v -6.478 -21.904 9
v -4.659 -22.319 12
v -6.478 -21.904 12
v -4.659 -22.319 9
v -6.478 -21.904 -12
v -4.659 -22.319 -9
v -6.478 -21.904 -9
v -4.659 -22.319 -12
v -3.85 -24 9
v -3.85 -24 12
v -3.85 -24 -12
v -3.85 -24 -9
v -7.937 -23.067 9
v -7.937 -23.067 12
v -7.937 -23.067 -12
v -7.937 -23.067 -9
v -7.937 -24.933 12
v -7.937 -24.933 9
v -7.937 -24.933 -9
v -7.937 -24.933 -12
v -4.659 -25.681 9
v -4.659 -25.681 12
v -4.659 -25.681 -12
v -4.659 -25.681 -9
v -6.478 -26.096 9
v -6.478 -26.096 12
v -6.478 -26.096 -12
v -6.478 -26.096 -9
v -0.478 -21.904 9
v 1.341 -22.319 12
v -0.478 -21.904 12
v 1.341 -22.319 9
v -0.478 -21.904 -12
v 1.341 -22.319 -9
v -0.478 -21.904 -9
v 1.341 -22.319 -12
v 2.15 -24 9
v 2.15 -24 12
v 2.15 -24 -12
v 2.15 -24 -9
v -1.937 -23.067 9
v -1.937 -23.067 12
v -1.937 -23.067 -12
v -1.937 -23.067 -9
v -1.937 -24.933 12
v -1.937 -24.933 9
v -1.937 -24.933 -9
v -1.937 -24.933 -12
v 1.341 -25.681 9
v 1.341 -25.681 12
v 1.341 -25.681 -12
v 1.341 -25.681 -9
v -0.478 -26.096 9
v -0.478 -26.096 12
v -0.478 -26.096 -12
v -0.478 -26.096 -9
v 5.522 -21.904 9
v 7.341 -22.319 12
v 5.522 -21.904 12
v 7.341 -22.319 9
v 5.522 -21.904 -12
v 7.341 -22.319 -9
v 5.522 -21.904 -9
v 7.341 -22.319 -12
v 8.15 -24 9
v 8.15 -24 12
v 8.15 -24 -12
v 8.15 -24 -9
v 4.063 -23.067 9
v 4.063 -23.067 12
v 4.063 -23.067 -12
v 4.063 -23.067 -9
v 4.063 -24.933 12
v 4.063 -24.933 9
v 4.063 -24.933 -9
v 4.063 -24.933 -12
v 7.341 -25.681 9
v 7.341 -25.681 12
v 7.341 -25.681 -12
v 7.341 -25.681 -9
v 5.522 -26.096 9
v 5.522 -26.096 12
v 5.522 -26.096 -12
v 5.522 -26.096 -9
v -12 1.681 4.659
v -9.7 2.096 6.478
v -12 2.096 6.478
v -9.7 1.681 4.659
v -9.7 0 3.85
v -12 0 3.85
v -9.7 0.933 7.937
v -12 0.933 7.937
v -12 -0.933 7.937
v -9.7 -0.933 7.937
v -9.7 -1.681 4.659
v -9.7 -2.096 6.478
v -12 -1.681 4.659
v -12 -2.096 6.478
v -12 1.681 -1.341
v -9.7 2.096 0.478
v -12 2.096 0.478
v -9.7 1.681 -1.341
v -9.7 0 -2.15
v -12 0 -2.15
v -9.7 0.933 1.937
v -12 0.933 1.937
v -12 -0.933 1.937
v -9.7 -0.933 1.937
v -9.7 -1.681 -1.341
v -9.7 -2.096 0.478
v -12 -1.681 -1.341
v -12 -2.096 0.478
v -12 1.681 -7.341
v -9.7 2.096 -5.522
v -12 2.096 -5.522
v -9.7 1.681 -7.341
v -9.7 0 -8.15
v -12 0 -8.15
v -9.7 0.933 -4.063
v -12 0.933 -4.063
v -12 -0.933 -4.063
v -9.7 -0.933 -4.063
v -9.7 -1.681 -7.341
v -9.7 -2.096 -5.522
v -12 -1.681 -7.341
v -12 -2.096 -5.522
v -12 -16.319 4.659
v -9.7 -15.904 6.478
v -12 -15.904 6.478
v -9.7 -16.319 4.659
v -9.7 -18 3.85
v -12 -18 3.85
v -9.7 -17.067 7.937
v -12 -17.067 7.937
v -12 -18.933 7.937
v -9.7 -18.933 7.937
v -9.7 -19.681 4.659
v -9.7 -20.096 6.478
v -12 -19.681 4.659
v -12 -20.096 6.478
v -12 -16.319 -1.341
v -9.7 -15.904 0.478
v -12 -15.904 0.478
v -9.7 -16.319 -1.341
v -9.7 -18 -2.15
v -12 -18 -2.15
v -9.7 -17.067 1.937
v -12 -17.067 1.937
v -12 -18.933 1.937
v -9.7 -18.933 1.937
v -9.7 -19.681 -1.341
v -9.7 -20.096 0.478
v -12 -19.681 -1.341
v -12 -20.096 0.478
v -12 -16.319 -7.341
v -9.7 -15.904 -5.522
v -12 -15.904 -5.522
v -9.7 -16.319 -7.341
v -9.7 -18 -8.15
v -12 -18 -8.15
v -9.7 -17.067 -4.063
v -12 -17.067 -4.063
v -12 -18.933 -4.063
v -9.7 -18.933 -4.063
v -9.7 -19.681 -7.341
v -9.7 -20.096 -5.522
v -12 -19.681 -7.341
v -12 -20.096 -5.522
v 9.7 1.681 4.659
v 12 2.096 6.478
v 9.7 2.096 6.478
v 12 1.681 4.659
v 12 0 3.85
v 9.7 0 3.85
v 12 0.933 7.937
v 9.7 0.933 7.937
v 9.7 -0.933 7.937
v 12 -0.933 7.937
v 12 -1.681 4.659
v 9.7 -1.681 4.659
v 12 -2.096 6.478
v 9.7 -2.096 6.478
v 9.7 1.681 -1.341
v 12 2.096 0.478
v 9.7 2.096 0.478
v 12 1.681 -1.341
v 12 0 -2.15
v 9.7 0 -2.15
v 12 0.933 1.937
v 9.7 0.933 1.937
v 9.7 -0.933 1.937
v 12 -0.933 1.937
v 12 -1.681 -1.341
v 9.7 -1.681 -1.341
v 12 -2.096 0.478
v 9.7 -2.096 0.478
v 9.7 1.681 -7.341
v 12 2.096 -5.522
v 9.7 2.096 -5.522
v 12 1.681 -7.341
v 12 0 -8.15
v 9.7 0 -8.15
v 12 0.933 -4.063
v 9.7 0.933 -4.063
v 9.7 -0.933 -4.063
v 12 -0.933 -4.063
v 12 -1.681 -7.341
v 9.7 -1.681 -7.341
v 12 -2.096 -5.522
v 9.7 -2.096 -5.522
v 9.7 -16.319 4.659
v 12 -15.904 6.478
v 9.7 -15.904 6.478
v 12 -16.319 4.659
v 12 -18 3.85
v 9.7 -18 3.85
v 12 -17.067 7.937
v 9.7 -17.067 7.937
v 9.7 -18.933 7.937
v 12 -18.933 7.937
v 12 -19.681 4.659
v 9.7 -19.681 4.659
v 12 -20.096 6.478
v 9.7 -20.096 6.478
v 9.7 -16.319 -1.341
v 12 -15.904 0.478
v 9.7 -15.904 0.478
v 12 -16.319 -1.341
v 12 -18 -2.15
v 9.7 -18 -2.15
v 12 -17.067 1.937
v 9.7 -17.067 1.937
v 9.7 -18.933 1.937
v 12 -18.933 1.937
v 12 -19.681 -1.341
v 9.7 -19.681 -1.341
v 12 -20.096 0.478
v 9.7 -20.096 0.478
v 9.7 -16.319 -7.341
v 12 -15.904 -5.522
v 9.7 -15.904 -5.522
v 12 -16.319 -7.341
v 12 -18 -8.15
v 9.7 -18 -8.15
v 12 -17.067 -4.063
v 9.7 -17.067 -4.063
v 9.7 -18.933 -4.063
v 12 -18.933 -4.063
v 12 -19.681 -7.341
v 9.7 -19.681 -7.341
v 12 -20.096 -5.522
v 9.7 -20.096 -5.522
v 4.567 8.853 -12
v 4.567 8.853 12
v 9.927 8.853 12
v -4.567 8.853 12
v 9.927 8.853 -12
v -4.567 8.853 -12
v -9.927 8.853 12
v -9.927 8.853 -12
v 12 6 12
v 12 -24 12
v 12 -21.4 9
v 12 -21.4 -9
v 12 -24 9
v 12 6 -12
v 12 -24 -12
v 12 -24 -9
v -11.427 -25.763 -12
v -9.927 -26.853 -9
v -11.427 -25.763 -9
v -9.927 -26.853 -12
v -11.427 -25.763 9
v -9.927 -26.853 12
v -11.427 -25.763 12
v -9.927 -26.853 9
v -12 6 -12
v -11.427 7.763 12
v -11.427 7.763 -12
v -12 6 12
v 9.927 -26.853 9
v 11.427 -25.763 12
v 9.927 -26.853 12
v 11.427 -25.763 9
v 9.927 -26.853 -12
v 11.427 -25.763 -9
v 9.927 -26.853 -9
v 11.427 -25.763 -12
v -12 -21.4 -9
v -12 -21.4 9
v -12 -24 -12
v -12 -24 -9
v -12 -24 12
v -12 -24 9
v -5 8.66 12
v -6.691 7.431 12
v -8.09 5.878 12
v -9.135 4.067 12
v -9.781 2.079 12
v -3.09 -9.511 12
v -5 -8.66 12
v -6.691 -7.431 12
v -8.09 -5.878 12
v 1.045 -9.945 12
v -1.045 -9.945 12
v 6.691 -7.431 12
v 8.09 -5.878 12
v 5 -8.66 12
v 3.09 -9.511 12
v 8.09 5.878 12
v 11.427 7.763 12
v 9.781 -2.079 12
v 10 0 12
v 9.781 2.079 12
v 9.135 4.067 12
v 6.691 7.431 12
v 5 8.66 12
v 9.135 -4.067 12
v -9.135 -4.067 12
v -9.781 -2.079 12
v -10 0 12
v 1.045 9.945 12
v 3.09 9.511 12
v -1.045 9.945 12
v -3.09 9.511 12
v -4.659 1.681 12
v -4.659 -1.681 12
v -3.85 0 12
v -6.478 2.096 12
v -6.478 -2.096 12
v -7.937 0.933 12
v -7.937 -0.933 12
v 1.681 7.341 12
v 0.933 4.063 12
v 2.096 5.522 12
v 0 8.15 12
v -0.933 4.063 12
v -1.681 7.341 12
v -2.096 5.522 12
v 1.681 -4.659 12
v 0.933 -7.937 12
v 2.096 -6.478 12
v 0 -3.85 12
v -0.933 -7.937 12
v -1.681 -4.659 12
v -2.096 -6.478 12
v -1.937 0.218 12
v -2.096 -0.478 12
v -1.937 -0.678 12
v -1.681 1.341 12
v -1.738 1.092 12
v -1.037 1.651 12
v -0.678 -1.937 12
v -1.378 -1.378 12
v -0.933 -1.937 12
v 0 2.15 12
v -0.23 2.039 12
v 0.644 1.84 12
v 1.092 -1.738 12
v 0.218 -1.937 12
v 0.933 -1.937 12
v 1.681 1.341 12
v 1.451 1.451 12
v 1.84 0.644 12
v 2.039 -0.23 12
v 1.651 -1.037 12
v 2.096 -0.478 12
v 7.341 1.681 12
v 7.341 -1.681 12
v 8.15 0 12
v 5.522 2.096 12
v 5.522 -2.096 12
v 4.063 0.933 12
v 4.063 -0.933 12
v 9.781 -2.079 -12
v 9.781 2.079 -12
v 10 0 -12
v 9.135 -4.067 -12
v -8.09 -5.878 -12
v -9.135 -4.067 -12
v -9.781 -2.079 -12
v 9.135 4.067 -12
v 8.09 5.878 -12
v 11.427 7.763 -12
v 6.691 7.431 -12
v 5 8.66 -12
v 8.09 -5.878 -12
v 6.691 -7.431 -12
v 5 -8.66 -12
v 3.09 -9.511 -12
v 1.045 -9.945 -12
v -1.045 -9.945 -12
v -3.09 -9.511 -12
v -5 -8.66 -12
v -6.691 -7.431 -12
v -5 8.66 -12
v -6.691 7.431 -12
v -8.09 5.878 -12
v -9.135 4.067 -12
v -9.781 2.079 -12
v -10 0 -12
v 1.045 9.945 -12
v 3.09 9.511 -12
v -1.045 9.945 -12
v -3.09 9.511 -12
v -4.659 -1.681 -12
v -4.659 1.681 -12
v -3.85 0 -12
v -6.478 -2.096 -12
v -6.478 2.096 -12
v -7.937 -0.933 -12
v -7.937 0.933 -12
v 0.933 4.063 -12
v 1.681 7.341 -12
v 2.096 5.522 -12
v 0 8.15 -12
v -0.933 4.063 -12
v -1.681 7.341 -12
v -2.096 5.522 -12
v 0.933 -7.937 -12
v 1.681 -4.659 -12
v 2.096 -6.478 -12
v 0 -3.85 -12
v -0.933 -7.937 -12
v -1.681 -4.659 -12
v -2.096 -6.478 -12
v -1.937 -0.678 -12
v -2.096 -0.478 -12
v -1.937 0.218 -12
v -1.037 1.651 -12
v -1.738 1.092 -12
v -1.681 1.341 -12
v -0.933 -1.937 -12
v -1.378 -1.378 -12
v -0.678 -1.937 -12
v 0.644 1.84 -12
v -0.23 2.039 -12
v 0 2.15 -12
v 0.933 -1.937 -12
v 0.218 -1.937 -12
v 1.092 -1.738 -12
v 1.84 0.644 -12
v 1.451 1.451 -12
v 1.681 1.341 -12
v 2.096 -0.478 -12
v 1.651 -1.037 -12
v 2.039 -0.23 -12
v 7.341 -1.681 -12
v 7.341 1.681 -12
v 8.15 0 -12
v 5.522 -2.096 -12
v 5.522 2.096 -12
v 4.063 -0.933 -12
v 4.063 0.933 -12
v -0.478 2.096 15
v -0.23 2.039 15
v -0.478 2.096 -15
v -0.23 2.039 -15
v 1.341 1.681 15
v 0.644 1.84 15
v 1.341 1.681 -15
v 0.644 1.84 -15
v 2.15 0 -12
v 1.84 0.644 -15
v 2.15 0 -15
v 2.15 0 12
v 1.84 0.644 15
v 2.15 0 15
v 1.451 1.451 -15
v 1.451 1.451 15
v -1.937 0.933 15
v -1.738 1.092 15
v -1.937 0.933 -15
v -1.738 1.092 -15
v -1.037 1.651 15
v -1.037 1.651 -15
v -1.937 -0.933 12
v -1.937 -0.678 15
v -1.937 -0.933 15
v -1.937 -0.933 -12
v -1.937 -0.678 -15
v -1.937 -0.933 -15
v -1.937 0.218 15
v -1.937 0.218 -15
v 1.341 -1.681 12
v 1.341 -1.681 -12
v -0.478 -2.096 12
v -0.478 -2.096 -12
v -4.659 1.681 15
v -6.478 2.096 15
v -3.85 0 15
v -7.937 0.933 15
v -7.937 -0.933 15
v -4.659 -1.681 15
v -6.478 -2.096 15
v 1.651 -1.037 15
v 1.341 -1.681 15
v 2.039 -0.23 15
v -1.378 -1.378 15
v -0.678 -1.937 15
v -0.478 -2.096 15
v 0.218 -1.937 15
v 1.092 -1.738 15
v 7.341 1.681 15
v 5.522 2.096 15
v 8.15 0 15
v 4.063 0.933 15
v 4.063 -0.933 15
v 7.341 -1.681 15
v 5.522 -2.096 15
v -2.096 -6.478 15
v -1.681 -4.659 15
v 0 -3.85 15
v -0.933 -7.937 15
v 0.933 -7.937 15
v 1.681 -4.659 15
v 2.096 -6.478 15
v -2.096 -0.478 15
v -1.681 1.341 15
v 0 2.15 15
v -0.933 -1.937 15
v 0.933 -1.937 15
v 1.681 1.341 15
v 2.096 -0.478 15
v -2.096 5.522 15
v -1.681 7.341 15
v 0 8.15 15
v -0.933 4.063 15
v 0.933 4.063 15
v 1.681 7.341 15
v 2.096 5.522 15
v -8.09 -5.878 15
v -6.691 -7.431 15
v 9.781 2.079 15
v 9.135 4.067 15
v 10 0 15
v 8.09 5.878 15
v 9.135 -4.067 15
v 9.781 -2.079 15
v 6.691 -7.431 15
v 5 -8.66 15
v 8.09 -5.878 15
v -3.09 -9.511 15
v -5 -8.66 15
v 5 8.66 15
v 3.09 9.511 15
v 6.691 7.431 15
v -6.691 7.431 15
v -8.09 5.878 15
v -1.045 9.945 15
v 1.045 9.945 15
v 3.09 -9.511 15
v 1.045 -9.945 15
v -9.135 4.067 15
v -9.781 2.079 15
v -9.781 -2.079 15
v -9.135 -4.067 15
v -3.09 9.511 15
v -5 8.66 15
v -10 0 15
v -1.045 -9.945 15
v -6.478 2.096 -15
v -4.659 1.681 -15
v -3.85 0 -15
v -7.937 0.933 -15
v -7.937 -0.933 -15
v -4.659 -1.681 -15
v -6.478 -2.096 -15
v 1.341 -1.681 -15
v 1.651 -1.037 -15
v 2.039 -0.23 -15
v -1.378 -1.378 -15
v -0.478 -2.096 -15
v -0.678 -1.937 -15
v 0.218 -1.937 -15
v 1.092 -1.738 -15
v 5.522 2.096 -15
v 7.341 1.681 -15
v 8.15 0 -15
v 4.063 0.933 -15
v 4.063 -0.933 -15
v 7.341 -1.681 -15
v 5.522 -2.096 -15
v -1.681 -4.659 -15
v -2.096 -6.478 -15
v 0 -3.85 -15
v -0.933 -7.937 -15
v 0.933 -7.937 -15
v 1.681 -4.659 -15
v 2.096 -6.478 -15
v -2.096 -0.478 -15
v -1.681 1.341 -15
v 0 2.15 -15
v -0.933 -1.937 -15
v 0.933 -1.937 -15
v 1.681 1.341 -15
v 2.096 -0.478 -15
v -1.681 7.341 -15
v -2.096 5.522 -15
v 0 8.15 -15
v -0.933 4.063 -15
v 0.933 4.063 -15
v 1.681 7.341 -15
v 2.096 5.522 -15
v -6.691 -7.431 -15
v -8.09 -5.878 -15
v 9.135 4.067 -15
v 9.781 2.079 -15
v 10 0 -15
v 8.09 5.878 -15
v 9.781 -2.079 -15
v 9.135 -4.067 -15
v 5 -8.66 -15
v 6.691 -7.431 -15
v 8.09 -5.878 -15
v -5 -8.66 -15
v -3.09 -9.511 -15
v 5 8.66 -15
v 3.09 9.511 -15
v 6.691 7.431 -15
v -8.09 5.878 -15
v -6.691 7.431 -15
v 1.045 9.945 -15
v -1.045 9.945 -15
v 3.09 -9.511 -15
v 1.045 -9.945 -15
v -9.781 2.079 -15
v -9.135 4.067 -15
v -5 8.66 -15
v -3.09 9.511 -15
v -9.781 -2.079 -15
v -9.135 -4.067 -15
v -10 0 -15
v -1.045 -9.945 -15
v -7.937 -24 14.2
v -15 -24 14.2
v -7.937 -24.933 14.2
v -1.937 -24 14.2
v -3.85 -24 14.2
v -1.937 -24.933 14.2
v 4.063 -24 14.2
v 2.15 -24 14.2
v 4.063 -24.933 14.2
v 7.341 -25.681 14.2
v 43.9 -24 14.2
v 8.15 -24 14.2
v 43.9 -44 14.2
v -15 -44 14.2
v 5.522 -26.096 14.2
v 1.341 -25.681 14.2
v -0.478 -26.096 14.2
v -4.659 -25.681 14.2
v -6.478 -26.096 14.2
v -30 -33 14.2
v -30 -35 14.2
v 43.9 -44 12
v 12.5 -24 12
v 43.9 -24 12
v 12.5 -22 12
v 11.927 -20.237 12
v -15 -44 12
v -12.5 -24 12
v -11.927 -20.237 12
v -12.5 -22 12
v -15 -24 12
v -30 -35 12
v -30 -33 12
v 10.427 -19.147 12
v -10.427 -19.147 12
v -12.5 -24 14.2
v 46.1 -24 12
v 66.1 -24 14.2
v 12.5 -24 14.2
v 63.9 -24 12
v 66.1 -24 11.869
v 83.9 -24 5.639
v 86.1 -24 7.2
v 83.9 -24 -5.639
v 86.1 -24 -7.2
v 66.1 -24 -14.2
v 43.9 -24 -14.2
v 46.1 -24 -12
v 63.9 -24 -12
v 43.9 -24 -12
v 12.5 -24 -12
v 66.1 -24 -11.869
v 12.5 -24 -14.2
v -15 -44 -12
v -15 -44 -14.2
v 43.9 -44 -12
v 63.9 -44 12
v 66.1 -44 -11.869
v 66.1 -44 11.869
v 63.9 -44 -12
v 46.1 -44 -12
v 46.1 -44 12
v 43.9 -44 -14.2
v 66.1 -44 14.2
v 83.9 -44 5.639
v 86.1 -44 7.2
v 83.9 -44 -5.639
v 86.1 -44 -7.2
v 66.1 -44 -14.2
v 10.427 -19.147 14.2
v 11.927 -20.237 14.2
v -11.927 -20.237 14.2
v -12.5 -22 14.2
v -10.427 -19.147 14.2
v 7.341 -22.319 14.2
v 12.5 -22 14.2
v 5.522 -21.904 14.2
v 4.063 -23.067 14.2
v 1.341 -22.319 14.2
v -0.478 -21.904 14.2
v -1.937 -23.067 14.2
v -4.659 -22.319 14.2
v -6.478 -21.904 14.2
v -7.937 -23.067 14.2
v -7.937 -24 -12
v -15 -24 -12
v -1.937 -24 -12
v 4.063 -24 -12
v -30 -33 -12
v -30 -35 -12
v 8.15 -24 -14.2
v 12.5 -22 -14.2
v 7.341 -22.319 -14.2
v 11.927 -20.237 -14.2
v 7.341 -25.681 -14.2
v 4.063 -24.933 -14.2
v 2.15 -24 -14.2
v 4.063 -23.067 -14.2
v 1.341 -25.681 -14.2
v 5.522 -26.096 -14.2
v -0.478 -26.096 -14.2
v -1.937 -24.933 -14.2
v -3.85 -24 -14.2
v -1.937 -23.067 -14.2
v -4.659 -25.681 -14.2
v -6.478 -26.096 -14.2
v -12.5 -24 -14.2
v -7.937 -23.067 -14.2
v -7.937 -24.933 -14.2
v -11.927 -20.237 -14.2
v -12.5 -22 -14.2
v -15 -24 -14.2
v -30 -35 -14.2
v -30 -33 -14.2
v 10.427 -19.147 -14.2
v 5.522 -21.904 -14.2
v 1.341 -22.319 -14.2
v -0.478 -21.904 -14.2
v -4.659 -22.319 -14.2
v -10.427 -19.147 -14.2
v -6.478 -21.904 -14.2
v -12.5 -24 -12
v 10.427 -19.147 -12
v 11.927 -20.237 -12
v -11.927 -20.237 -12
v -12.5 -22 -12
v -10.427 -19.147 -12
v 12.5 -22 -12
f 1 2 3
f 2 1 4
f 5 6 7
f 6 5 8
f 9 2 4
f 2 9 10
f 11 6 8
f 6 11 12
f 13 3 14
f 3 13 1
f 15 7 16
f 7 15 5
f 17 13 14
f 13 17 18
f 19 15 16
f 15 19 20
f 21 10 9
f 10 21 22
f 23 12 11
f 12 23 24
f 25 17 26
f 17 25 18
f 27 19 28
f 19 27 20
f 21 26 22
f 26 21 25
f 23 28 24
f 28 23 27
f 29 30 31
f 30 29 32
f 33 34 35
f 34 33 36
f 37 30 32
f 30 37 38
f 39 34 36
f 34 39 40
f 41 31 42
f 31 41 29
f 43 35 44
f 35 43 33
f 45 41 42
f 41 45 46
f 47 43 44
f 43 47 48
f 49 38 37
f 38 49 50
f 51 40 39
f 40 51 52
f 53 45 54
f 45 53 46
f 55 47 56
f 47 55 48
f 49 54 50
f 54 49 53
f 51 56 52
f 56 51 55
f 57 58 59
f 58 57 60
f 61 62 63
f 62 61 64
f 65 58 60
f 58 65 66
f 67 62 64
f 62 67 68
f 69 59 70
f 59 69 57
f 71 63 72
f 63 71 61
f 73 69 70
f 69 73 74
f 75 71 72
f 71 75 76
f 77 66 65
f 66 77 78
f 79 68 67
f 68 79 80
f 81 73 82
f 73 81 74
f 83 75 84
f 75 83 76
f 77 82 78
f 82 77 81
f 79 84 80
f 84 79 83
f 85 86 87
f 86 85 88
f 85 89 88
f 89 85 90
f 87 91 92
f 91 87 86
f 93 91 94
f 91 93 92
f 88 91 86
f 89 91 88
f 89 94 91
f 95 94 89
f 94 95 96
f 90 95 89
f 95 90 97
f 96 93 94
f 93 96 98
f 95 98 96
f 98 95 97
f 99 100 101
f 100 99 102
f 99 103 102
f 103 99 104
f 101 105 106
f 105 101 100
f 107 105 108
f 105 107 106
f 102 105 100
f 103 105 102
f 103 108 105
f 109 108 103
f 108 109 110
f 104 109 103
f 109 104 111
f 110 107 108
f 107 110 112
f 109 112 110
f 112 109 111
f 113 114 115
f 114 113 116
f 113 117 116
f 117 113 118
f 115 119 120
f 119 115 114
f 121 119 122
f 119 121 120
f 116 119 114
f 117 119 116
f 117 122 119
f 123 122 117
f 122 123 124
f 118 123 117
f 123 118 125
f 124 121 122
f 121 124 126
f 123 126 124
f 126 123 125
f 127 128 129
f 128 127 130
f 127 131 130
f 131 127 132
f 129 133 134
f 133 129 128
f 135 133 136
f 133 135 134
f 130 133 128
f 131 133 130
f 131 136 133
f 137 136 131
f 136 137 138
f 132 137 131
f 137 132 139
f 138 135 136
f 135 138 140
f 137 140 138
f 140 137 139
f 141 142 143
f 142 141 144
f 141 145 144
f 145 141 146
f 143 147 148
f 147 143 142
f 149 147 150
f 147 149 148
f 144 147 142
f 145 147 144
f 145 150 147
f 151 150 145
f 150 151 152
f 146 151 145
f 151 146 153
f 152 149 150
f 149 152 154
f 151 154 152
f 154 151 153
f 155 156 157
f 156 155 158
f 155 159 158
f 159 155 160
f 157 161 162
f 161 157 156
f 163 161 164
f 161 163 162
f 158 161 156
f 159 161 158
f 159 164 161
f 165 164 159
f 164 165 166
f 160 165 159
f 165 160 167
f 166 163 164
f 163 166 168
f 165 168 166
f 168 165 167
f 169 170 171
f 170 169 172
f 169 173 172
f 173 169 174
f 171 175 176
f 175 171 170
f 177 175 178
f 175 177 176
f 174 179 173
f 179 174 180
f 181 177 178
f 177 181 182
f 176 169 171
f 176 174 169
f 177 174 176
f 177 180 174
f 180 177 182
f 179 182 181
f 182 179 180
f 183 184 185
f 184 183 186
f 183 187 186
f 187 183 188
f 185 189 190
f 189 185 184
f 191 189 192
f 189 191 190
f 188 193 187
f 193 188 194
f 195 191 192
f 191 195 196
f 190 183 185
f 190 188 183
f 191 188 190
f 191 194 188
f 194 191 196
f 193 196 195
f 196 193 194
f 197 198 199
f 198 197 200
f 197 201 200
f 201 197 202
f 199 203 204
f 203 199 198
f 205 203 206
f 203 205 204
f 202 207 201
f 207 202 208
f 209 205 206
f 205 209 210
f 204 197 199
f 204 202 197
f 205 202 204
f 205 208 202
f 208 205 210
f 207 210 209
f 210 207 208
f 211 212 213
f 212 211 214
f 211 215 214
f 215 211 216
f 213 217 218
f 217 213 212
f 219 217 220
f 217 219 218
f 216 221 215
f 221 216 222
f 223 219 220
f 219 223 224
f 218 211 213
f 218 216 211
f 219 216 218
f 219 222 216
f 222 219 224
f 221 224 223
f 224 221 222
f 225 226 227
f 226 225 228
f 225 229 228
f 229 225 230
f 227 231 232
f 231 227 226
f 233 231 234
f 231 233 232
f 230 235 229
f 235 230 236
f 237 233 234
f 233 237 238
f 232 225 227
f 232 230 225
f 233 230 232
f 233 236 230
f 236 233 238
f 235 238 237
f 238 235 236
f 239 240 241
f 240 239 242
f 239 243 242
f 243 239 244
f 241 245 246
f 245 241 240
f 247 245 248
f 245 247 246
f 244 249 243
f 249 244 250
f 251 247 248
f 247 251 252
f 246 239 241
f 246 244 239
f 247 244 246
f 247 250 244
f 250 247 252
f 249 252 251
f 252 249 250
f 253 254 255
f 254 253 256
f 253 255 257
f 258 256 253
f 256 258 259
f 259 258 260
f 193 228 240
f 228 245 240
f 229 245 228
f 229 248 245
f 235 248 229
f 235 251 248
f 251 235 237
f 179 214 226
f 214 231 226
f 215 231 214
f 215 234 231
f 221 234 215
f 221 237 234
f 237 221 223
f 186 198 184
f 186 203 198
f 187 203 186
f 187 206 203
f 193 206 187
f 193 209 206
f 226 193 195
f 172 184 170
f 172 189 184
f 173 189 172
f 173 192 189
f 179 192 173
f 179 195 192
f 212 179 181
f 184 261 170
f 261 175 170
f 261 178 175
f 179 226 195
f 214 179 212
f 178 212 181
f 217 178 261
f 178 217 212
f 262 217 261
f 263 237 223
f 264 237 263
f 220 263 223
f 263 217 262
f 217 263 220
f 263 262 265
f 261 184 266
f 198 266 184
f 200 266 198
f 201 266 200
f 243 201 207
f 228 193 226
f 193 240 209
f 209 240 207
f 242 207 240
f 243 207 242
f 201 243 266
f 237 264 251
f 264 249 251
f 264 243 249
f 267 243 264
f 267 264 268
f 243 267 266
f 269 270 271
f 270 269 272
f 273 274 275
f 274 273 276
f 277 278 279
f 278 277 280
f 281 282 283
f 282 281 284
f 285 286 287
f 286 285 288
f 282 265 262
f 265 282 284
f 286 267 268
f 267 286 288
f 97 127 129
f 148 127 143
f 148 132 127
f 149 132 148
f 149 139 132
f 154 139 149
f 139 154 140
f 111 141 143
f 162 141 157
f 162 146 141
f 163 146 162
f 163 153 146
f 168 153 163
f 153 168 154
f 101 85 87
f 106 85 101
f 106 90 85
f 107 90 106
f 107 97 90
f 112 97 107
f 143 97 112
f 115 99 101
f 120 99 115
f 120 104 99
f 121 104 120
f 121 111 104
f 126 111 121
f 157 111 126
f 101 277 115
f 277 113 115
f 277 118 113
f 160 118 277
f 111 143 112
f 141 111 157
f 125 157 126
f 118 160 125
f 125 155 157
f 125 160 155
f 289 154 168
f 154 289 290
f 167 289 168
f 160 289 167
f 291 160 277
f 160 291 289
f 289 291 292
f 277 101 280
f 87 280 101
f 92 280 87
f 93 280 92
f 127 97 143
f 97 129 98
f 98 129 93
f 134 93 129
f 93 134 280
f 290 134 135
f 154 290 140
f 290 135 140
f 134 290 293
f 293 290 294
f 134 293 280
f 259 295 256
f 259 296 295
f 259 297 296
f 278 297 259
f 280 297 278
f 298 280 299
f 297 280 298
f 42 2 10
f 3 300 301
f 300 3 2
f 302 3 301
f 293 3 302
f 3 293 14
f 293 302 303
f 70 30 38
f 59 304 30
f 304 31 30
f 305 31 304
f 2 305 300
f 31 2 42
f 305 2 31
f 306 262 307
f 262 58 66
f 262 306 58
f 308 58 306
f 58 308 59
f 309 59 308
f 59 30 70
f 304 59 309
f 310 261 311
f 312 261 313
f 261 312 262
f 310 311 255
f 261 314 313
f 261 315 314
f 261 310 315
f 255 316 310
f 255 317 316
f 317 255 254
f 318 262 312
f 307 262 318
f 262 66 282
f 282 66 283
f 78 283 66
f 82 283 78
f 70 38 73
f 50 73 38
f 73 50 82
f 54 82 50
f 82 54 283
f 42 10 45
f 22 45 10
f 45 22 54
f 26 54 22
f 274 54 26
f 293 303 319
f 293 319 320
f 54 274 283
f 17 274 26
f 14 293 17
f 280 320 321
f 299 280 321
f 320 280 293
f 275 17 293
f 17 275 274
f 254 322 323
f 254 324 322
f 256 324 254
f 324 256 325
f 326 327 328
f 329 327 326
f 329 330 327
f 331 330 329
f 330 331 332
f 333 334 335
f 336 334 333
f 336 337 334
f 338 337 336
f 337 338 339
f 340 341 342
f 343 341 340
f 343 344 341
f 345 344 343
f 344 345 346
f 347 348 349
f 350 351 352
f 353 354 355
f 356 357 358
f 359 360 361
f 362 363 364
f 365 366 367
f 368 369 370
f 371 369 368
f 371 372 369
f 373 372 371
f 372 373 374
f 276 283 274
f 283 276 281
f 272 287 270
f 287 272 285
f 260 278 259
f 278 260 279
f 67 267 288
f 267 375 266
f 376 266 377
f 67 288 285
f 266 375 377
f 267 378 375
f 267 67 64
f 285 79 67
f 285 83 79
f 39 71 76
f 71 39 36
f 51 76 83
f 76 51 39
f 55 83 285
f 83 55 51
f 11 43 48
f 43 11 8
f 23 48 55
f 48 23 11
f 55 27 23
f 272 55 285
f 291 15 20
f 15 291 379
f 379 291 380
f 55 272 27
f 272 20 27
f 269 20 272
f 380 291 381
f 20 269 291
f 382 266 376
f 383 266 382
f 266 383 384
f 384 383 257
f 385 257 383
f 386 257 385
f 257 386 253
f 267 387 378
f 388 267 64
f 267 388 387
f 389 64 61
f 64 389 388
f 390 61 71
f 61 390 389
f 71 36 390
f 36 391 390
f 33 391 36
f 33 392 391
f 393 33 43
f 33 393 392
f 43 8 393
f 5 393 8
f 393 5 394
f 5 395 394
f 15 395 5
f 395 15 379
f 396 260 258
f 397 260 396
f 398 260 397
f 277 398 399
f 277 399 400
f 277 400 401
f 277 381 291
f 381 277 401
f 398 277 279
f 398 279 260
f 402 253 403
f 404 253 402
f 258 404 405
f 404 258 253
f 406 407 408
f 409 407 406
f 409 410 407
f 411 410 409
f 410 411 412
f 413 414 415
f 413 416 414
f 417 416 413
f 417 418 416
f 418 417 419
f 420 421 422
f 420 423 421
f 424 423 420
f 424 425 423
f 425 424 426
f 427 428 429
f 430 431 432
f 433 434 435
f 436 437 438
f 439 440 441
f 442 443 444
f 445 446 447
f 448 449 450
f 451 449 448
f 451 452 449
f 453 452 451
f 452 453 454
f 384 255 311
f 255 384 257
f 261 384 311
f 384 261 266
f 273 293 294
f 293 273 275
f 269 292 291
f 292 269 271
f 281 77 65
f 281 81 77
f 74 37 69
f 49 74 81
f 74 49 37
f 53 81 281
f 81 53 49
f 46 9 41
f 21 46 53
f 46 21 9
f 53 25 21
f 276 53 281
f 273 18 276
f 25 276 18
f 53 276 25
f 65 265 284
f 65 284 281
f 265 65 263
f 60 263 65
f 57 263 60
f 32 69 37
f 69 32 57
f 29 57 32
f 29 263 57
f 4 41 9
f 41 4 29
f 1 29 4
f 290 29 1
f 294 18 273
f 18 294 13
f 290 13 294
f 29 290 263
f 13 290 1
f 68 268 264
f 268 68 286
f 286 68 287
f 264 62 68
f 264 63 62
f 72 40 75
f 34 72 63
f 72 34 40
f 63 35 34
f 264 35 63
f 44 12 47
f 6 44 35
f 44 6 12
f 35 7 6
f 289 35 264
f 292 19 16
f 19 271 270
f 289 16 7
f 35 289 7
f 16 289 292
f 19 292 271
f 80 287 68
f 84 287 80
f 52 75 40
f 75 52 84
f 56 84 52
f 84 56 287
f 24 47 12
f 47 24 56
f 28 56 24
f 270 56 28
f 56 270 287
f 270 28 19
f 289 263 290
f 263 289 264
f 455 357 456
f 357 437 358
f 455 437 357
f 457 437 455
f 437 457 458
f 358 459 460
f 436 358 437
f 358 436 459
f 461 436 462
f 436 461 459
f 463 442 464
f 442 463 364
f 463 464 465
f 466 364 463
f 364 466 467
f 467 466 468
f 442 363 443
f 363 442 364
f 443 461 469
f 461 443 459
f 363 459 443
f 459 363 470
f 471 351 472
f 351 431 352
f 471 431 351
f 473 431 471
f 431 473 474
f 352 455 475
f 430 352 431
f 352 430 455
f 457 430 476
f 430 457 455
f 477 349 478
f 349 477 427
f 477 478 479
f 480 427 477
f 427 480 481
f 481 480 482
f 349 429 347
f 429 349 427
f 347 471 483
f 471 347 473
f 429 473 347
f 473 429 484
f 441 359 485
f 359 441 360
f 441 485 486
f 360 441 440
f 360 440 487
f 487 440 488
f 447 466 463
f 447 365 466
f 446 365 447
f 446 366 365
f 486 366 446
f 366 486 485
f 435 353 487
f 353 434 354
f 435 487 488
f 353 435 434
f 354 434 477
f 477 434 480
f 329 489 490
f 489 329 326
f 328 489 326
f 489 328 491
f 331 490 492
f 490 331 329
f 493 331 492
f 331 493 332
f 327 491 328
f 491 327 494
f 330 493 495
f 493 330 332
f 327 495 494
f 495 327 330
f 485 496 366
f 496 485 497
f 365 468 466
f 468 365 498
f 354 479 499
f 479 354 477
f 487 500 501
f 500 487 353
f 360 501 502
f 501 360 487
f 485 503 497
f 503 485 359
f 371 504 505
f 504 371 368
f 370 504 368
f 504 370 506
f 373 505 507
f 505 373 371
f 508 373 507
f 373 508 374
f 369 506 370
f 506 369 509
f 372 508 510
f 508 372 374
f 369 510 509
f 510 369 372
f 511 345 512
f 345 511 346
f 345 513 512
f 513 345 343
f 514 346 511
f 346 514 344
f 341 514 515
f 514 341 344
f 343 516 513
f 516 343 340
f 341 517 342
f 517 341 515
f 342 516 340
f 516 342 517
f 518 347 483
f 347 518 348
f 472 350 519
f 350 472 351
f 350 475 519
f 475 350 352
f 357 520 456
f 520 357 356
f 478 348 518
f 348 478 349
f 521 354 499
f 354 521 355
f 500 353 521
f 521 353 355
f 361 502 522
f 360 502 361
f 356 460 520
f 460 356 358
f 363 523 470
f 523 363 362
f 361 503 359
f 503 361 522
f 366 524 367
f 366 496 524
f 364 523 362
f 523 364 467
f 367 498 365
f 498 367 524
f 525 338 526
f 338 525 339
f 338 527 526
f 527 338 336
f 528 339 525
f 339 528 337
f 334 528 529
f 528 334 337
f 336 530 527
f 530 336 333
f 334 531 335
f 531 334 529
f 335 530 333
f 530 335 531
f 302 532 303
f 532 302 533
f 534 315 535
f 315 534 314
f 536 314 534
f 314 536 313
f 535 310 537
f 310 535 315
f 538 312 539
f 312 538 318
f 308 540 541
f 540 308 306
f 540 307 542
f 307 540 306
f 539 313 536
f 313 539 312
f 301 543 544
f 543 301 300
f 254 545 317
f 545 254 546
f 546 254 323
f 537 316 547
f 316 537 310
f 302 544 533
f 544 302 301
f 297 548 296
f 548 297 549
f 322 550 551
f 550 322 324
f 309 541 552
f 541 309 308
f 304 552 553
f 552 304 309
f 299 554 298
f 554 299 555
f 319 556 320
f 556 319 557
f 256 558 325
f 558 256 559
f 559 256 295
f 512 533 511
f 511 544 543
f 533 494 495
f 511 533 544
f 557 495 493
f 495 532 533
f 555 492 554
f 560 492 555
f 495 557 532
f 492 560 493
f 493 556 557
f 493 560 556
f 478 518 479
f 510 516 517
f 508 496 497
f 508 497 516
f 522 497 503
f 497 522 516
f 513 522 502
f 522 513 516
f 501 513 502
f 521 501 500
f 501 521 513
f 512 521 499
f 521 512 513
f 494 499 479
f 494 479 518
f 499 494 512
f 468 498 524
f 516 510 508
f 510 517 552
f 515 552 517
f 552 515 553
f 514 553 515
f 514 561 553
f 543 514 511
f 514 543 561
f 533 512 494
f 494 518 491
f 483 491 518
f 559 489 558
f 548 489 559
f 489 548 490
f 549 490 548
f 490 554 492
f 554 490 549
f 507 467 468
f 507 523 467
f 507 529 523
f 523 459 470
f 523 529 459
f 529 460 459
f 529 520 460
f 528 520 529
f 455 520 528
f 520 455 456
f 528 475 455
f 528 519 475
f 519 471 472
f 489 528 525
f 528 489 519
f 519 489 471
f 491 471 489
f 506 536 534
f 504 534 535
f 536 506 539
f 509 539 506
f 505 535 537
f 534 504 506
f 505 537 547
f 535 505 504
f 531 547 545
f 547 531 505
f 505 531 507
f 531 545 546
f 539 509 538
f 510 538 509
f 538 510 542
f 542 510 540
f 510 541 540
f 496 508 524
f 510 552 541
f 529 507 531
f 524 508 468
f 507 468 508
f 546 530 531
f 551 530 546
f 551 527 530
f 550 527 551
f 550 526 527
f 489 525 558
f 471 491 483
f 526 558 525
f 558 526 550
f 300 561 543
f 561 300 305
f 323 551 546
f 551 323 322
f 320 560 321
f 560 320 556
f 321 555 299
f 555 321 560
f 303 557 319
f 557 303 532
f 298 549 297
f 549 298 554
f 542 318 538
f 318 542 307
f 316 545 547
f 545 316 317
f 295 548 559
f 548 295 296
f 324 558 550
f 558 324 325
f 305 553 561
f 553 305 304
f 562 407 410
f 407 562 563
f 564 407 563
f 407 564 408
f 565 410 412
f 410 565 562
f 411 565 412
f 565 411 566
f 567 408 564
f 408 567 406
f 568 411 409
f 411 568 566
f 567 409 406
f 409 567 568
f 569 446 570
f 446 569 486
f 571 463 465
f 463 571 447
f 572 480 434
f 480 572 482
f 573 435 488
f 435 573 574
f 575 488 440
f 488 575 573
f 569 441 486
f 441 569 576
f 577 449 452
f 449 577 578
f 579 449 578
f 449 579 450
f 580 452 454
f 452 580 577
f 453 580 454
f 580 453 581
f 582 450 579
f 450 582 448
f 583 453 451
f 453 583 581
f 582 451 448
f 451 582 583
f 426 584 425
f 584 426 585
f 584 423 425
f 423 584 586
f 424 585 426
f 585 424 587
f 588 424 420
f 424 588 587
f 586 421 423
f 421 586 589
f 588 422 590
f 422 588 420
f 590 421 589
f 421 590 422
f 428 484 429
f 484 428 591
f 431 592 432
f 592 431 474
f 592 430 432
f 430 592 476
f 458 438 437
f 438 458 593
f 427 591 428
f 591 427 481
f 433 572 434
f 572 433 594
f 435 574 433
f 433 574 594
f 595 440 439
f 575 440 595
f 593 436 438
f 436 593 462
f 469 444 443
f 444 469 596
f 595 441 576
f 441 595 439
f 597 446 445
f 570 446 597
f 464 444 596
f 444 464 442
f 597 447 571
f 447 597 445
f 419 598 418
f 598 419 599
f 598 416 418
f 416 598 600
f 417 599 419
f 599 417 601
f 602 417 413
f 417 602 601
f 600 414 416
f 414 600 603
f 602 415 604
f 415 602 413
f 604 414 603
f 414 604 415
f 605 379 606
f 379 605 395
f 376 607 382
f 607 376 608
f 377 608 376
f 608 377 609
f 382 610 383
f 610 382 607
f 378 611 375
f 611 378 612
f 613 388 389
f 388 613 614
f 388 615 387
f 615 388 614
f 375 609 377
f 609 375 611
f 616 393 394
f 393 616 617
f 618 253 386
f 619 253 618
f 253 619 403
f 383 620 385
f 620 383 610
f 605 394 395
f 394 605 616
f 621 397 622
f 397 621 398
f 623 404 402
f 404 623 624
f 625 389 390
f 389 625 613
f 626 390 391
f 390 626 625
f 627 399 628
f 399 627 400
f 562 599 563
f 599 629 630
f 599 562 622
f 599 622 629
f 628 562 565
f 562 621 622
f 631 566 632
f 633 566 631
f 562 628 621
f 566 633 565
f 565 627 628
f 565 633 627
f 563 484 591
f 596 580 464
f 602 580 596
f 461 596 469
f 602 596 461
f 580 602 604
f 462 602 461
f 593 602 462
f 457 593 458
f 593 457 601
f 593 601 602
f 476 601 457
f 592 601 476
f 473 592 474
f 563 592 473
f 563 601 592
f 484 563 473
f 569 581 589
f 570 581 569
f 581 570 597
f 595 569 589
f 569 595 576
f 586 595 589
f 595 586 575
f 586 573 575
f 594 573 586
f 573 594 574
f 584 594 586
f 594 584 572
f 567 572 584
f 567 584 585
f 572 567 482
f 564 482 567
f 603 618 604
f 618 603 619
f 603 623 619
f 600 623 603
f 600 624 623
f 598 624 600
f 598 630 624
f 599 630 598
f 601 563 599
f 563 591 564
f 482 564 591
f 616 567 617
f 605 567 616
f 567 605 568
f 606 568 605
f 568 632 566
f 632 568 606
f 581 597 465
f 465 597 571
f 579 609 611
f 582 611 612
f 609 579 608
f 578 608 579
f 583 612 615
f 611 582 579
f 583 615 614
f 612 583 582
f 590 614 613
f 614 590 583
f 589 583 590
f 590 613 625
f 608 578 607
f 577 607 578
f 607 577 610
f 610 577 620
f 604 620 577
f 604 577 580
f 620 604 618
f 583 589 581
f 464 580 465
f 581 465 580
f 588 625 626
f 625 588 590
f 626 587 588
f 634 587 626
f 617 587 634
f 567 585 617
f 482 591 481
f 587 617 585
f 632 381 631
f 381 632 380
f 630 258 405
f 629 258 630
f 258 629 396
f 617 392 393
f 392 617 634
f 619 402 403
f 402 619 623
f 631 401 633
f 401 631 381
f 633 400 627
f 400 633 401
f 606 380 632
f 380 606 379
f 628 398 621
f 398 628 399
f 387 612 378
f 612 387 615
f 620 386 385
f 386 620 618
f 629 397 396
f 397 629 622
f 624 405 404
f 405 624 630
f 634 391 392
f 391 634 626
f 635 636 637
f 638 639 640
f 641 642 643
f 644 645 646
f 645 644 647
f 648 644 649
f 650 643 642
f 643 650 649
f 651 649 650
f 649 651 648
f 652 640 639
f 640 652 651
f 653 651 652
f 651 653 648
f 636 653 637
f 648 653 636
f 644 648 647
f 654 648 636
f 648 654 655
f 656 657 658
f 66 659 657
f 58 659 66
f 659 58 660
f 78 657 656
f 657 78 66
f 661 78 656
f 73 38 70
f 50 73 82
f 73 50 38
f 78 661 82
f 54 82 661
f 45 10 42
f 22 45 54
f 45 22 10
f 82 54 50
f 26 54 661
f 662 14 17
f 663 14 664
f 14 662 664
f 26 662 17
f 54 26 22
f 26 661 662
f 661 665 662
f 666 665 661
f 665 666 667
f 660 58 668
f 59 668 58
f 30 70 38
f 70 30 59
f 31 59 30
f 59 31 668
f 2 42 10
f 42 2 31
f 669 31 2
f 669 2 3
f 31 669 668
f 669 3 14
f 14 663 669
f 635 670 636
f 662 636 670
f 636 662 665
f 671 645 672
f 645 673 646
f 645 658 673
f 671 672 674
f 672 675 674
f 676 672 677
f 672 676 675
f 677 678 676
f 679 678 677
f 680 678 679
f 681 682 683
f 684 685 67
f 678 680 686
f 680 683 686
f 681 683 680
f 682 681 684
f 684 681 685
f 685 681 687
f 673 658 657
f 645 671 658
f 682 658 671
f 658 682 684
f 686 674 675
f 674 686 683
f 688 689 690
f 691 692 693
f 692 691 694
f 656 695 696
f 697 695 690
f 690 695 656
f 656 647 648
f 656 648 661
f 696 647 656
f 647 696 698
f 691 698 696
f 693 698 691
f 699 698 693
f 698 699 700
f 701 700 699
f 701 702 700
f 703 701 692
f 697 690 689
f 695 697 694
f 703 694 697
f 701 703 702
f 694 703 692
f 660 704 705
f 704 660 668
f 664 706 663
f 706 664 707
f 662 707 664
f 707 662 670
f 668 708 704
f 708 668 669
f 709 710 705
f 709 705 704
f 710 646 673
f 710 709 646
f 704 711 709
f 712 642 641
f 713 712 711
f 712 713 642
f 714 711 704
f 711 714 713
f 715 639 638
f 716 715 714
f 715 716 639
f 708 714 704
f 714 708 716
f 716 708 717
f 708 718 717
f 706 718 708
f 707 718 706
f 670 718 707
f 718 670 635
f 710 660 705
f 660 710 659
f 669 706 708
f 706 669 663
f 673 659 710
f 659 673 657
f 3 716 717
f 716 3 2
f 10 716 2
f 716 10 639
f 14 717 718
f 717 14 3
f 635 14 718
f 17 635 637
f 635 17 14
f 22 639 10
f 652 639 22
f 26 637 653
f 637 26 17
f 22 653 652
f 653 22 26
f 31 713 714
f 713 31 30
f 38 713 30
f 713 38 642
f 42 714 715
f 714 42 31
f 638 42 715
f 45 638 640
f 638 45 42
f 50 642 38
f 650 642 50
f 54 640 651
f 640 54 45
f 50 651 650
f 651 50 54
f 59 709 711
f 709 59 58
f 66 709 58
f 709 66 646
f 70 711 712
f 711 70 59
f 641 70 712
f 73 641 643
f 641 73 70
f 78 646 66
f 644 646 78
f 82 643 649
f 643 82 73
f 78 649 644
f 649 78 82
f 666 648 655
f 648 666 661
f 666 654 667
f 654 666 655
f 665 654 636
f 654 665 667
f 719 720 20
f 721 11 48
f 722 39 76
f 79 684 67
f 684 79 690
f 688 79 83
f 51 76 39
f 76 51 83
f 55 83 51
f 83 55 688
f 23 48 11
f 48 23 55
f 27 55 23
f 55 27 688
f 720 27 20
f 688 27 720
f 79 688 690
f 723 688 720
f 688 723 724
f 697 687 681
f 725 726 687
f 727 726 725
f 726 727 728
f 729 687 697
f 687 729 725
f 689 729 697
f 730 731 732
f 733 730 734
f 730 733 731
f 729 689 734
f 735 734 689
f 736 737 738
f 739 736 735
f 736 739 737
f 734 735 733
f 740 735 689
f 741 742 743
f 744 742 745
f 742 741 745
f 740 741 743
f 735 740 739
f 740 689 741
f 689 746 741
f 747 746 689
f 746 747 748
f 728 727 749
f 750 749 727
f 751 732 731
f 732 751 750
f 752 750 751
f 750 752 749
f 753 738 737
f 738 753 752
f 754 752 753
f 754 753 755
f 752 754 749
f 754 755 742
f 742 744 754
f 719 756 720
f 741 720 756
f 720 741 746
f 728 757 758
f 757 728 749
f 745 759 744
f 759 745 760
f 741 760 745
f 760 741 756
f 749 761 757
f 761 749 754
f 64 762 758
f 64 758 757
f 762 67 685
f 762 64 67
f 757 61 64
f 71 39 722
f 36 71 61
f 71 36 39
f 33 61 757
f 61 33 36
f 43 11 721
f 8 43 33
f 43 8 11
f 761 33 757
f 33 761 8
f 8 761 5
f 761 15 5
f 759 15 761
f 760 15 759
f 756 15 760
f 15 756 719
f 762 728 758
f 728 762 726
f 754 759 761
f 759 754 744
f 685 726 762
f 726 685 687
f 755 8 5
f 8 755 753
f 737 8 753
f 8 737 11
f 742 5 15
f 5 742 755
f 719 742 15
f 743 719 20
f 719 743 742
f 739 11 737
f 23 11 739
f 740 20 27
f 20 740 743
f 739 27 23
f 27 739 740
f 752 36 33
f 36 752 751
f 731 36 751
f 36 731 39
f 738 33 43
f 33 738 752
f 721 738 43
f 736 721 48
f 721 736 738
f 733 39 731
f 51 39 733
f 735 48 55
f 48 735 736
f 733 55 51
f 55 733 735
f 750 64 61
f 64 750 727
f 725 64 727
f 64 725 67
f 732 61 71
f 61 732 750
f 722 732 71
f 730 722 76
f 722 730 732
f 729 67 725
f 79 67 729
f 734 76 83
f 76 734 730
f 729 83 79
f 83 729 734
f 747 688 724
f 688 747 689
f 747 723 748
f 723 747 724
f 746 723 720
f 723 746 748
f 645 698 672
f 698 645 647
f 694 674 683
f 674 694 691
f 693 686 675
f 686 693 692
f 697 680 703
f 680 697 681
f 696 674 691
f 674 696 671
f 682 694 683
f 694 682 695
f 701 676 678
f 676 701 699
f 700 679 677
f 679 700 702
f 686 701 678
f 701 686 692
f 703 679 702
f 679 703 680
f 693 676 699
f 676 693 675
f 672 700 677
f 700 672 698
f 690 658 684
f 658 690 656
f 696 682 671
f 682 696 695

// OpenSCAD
// file: ../models/arm.scad
Collisions=false;
include <ollo.scad>;

module arm_pulley(pulley=false)
{
	c = pulley?[0.6,0.6,0.6]:[0.2,0.2,0.2];
    if (!Collisions) {
	    color(c) {
		difference() {
		    cylinder(d=20, h=OlloWidth);
		    servoArm(OlloWidth, false);
		}
	    }
    }
}

//:Model "Arm" [0.1,0.1,0.1]
module arm(pulley=false) {
    arm_pulley();
}

//:Model "Pulley" [0.6,0.6,0.6]
module pulley() {
    //:BOM "Ollo pulley" 0.2 http://www.robotis-shop-en.com/?act=shop_en.goods_view&GS=1590
    arm_pulley(true);
}

arm();
// file: ../models/motor.scad
Collisions=false;
include <ollo.scad>;
include <motor_values.scad>;
use <../util/rounded.scad>;

//:Model "Motor" [0.4,0.45,0.4]
//:Mass 16.7
module motor(thickness=2.2) {
    //:BOM "XL-320 Servo" 21.9 http://www.robotis-shop-en.com/?act=shop_en.goods_view&GS=1611
    translate([0,-MotorArmOffset,-MotorDepth/2]) {
        color([0.25,0.25,0.25]) {
            difference() {
                rounded(MotorWidth,MotorHeight,MotorDepth,3,center=true);

		if (!Collisions) {
			// Bottom
			translate([-MotorWidth/2-0.1,-MotorHeight/2-0.1,3])
			    cube([MotorWidth+0.2, 5.7, MotorDepth-6]);

			translate([0,-MotorHeight/2+3])
			    threeOllo(MotorDepth, false);

			// Motor shaft
			translate([0, MotorArmOffset])
			    olloHole(MotorDepth+5, false);

			// Side holes
			for (side=[-MotorWidth/2,MotorWidth/2-thickness]) {
			    translate([side,9,MotorDepth/2]) {
				rotate([0,90,0]) {
				    threeOllo(thickness, false);
				    translate([0,-3*OlloSpacing,0])
					threeOllo(thickness, false);
				}
			    }
			}
		}
            }
        }
    }
}

motor();
// file: ../util/rounded.scad
Collisions=false;

// Do a rounded cube
module rounded(x=10, y=10, z=10, r=3, center=false) {
    if (Collisions) {
        translate([0,0,center?(z/2):0])
            cube([x,y,z], center=center);
    } else {
        if (center) {
            translate([-(x/2),-(y/2),0])
                rounded(x, y, z, r);
        } else {
            translate([r,r,0])
                minkowski() {
                    cube([x-2*r,y-2*r,z/2]);
                    cylinder(h=z/2, r=r);
                }
        }
    }
}
// file: ../models/ollo.scad
Collisions=false;

// Diameter of plastic ollo holes
OlloHoles = 4.3;

// Width of Ollo "real" plastic
OlloWidth = 3;

// Distance between two ollo holes
OlloSpacing = 6;

module rivet()
{
    //:BOM "Ollo rivet" 0.05 http://www.robotis-shop-en.com/?act=shop_en.goods_view&GS=1605
}

// Do an Ollo hole on the part
module olloHole(depth=2.2, rivet=true)
{
    if (!Collisions) {
        if (rivet) {
	    rivet();
        }
        translate([0,0,-0.1])
            cylinder(depth+0.2, OlloHoles/2, OlloHoles/2);
    }	    
}

// Do 3 ollo holes
module threeOllo(depth=2.2, rivets=true)
{
    for (xy=[[-OlloSpacing,0],[0,0],[OlloSpacing,0]]) {
        translate([xy[0], xy[1], 0])
            olloHole(depth, rivets);
    }
}

// Do a servo arm holes
module servoArm(depth=2.2, rivets=true)
{
    if (rivets) {
        for (i=[1:5]) {
	    rivet();
	}
    }
    threeOllo(depth, false);
    rotate([0,0,90])
        threeOllo(depth, false);
}
// file: ../models/motor_values.scad
// Motor dimensions
MotorWidth = 24; 
MotorHeight = 36; 
MotorDepth = 24; 
MotorArmOffset = 9;
// file: ../models/motor_arm.scad
include <motor.scad>;
use <arm.scad>;

module motorArm(counterArm=true) {
    motor();
    translate([0,0,MotorDepth/2])
        arm();
    if (counterArm) {
        translate([0,0,-MotorDepth/2-OlloWidth]) {
            pulley();
        }
    }
}

motorArm();
// file: ../parts/leg.scad
Collisions=false;
SphereTip=false;
include <../models/motor_values.scad>;
use <../models/ollo.scad>;
use <../util/rounded.scad>;

//:Part
module leg(sizeA=60, sizeB=20, sizeC=20, sizeBottom=10,
        sizeTop=15, mode="arm", fixationAngle=0, thickness=2.2, holesPosition=15, print=false)
{
    xOffset = (mode == "side") ? -10 : 0;
    spacing = (mode == "side" || mode == "bottom") ? MotorWidth : MotorWidth+6;

    module legSide()
    {
        difference() {
            union() {
                translate([0,0,sizeA/2])
                    rotate([0,90,0]) {
                        cube([sizeA, 20, thickness], center=true);
                        if (mode == "side") {
                            translate([15-sizeA/2, 10, -thickness/2])
                                rotate([0,0,+fixationAngle])
                                rounded(25,10,thickness, center=true);
                        }
                    }
            }
            translate([-thickness, 0, sizeA-holesPosition]) {
                rotate([90,0,90]) {
                    if (mode == "arm") {
                        servoArm(2*thickness);
                    }
                }
                if (mode == "side") {
                    translate([0,10,0])
                        rotate([90,90-fixationAngle,90])
                        threeOllo(2*thickness);
                }
		if (mode == "bottom") {
                    translate([0,0,0])
                        rotate([90,fixationAngle,90])
                        threeOllo(2*thickness);
                }
            }
        }
	if (Collisions) {
		translate([0,0,sizeA+sizeTop-10]) {
			rotate([45,0,0])
			rotate([0,-90,0])
			cube([14,14,thickness],center=true);
		}
	} else {
		translate([-thickness/2,0,sizeA]) {
		    rotate([90,0,90])
			linear_extrude(thickness)
			polygon([[-10,0],[-1,sizeTop],[1,sizeTop],[10,0]]);
		}
	}
    }

    module biais() {
        Dx = (spacing-sizeBottom)/2;
        Dy = sizeC;
        Dl = sqrt(pow(Dx,2)+pow(Dy,2));

        translate([-(spacing/2)-thickness,-10,-(sizeB+thickness/2)])
            rotate([0,atan2(Dy,Dx),0])
            cube([Dl,20,thickness]);
    }

    if (print) {
        translate([0,0,10-xOffset])
            rotate([90,0,0])
            leg(sizeA, sizeB, sizeC, sizeBottom,
                    sizeTop, mode, fixationAngle, thickness, false);
    } else {
        translate([0,xOffset,-sizeA+holesPosition]) {
            cube([spacing+thickness*2, 20, thickness], center=true);

            translate([spacing/2+thickness/2,0,0])
                legSide();
            translate([-(spacing/2+thickness/2),0,0])
                legSide();

		if (!SphereTip || !Collisions) {
		    translate([0,0,-sizeB])
			cube([spacing+thickness*2, 20, thickness], center=true);
		    translate([spacing/2+thickness/2,0,-sizeB/2])
			cube([thickness,20,sizeB], center=true);
		    translate([-(spacing/2+thickness/2),0,-sizeB/2])
			cube([thickness,20,sizeB], center=true);

		    translate([0,0,-(sizeB+sizeC)])
			cube([sizeBottom+thickness*2, 20, thickness], center=true);

		    biais();
		    mirror([1,0,0])
			biais();
		} else {
		    translate([0,0,-(sizeB+sizeC+thickness)+20])
			sphere(20);  
		}
		translate([0,0,-(sizeB+sizeC+thickness)]) {
                        //:Tip
			//sphere(7);
		}
        }
    }
}

leg();
// main file
use <../parts/leg.scad>;
use <../models/motor_arm.scad>;

//:Component "Bottom leg (angle)"
//:Description "Leg on motor bottom"
//:Parameter SizeA "Size of the first part"
//:Parameter SizeB "Size of the second part"
//:Parameter SizeC "Size of the third part"
//:Parameter SizeBottom "Size of the bottom"
//:Parameter SizeTop "Size of the top"
//:Parameter FixationAngle "Fixation angle"
//:Parameter Thickness "Thickness of the part"
module bottom_leg_angle(SizeA=60, SizeB=20, SizeC=20, SizeBottom=10,
        SizeTop=15, FixationAngle=0, Thickness=2.2)
{
    //:Anchor motor male
    motorArm();

    translate([0,-(24),0]) {
    rotate([0,-90,FixationAngle]) {
	leg(SizeA, SizeB, SizeC, SizeBottom, SizeTop, "side", FixationAngle, Thickness);
    }
    }
}

bottom_leg_angle();
